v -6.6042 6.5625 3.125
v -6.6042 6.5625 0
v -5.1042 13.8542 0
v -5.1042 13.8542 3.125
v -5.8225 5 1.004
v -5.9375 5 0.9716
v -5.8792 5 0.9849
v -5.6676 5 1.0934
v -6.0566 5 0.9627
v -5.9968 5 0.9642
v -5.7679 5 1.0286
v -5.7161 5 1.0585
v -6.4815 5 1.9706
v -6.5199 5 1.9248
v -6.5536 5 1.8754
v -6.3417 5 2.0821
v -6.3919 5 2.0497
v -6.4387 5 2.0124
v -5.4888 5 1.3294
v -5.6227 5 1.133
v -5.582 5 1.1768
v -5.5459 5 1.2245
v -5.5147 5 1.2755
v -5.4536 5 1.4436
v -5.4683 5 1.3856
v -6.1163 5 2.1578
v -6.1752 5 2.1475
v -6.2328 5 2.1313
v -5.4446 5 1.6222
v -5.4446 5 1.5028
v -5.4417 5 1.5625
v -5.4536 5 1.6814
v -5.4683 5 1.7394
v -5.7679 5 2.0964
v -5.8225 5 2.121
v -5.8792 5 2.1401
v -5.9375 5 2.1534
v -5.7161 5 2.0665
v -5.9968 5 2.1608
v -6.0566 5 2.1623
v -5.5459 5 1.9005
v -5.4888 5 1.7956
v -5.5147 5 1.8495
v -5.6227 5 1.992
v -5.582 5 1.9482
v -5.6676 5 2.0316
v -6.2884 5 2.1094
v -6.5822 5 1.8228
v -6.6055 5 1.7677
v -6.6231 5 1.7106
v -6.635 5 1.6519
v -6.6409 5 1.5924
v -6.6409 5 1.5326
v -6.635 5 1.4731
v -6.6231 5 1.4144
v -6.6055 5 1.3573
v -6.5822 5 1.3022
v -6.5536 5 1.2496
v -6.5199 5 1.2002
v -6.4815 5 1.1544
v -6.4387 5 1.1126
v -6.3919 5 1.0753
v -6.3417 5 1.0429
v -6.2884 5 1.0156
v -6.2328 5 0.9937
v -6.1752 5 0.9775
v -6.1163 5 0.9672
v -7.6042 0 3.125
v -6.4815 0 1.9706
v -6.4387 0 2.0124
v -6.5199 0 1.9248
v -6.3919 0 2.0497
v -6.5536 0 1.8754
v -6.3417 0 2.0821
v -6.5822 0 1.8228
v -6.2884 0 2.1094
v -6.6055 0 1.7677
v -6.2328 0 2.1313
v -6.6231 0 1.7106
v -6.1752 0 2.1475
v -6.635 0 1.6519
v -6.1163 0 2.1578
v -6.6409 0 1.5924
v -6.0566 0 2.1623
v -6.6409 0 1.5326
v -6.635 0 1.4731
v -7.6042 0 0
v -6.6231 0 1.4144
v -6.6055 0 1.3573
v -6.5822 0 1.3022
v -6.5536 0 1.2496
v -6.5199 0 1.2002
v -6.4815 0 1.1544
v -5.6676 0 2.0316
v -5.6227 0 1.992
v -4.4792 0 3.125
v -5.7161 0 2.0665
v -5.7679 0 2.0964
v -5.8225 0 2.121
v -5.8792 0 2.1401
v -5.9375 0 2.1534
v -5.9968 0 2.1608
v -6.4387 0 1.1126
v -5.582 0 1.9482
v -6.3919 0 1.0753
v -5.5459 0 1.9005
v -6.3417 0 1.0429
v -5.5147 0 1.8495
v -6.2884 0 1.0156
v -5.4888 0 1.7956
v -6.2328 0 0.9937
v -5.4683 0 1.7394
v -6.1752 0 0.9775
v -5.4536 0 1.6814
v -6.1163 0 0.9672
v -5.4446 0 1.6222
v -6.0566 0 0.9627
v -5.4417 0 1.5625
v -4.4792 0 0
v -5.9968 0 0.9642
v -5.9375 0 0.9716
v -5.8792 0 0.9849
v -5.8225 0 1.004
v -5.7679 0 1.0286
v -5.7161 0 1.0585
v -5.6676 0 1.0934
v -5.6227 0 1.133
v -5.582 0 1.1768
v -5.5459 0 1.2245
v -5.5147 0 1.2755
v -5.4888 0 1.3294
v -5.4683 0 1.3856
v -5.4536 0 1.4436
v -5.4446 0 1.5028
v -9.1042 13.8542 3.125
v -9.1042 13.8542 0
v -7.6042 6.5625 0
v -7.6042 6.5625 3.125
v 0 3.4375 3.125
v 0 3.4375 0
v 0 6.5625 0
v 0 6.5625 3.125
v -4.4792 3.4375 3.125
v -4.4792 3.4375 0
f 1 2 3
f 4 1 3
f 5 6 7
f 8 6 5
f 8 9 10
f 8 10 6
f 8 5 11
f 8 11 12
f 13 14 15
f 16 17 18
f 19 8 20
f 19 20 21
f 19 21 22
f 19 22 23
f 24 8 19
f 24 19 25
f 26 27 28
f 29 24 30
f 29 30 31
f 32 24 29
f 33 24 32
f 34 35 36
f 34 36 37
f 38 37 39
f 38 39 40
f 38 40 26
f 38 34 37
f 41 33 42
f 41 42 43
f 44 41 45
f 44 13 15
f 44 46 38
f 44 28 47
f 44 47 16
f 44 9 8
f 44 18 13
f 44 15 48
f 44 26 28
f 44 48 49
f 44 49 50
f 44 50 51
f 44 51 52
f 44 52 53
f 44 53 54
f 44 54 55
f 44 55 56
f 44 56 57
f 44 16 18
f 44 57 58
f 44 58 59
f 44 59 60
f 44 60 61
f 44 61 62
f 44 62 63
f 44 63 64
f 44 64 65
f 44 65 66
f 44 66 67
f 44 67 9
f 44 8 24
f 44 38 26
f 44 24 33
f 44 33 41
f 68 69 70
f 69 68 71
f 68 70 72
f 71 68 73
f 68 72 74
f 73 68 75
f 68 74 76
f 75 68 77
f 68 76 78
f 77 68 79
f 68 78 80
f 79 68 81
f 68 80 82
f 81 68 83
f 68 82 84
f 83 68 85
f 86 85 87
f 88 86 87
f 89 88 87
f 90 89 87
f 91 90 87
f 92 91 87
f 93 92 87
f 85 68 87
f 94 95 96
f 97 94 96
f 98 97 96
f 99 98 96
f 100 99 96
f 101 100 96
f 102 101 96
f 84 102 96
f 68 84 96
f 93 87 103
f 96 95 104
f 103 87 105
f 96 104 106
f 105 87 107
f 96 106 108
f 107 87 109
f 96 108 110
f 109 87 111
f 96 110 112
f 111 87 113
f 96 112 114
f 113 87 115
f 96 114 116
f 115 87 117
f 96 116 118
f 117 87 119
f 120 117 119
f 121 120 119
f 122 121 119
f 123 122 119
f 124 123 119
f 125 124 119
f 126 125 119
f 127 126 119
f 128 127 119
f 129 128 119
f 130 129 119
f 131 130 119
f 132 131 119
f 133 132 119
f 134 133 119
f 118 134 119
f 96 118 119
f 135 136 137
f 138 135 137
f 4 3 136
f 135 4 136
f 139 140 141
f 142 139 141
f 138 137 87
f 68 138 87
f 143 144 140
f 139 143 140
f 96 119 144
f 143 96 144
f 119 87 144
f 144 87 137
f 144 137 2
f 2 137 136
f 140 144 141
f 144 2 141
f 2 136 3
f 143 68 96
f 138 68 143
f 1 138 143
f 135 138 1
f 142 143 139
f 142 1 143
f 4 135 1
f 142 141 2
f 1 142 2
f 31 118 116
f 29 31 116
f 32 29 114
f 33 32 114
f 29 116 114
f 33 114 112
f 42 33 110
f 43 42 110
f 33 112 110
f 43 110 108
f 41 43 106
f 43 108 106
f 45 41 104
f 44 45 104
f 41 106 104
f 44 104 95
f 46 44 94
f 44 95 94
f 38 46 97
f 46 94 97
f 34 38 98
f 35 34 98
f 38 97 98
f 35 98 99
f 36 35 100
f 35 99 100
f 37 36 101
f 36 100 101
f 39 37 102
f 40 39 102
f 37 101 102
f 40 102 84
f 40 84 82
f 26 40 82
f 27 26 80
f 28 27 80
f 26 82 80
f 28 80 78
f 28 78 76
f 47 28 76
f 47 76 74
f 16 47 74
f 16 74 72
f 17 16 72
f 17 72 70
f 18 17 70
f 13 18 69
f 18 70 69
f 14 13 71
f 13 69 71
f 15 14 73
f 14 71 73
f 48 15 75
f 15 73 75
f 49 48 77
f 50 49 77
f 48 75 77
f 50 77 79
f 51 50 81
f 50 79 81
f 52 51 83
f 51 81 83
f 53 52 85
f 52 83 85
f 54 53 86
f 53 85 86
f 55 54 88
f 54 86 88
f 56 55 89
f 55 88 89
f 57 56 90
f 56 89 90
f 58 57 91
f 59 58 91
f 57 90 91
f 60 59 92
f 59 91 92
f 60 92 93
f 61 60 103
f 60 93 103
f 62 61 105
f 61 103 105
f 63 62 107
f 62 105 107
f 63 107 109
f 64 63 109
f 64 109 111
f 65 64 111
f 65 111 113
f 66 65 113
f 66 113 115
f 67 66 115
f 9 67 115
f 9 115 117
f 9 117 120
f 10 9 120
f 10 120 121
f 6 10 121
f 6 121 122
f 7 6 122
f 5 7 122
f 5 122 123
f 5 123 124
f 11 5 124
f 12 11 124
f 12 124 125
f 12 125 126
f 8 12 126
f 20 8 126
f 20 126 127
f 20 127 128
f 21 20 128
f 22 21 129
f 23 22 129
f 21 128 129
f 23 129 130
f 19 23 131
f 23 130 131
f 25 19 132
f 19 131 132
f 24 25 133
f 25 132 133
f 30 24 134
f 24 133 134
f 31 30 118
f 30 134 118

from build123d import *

# Parameters (mm, degrees)
F1_DEPTH = 3.125
F2_R     = 0.6
F3_DEPTH = 5


with BuildPart() as f1:
    # F0 (on Top) → F1 (new body)
    with BuildSketch(Plane.XY):
        Polygon((-7.604167, 6.5625), (-7.604167, 0), (-4.479167, 0), (-4.479167, 3.4375), (0, 3.4375), (0, 6.5625), (-6.604167, 6.5625), align=None)
        Polygon((-9.104167, 13.854167), (-7.604167, 6.5625), (-6.604167, 6.5625), (-5.104167, 13.854167), align=None)
    extrude(amount=F1_DEPTH)

    # F2 (on face) → F3 (cut)
    with BuildSketch(Plane.XZ):
        with Locations((-6.041667, 1.5625)):
            Circle(F2_R)
    extrude(amount=-F3_DEPTH, mode=Mode.SUBTRACT)


solid = f1.part
